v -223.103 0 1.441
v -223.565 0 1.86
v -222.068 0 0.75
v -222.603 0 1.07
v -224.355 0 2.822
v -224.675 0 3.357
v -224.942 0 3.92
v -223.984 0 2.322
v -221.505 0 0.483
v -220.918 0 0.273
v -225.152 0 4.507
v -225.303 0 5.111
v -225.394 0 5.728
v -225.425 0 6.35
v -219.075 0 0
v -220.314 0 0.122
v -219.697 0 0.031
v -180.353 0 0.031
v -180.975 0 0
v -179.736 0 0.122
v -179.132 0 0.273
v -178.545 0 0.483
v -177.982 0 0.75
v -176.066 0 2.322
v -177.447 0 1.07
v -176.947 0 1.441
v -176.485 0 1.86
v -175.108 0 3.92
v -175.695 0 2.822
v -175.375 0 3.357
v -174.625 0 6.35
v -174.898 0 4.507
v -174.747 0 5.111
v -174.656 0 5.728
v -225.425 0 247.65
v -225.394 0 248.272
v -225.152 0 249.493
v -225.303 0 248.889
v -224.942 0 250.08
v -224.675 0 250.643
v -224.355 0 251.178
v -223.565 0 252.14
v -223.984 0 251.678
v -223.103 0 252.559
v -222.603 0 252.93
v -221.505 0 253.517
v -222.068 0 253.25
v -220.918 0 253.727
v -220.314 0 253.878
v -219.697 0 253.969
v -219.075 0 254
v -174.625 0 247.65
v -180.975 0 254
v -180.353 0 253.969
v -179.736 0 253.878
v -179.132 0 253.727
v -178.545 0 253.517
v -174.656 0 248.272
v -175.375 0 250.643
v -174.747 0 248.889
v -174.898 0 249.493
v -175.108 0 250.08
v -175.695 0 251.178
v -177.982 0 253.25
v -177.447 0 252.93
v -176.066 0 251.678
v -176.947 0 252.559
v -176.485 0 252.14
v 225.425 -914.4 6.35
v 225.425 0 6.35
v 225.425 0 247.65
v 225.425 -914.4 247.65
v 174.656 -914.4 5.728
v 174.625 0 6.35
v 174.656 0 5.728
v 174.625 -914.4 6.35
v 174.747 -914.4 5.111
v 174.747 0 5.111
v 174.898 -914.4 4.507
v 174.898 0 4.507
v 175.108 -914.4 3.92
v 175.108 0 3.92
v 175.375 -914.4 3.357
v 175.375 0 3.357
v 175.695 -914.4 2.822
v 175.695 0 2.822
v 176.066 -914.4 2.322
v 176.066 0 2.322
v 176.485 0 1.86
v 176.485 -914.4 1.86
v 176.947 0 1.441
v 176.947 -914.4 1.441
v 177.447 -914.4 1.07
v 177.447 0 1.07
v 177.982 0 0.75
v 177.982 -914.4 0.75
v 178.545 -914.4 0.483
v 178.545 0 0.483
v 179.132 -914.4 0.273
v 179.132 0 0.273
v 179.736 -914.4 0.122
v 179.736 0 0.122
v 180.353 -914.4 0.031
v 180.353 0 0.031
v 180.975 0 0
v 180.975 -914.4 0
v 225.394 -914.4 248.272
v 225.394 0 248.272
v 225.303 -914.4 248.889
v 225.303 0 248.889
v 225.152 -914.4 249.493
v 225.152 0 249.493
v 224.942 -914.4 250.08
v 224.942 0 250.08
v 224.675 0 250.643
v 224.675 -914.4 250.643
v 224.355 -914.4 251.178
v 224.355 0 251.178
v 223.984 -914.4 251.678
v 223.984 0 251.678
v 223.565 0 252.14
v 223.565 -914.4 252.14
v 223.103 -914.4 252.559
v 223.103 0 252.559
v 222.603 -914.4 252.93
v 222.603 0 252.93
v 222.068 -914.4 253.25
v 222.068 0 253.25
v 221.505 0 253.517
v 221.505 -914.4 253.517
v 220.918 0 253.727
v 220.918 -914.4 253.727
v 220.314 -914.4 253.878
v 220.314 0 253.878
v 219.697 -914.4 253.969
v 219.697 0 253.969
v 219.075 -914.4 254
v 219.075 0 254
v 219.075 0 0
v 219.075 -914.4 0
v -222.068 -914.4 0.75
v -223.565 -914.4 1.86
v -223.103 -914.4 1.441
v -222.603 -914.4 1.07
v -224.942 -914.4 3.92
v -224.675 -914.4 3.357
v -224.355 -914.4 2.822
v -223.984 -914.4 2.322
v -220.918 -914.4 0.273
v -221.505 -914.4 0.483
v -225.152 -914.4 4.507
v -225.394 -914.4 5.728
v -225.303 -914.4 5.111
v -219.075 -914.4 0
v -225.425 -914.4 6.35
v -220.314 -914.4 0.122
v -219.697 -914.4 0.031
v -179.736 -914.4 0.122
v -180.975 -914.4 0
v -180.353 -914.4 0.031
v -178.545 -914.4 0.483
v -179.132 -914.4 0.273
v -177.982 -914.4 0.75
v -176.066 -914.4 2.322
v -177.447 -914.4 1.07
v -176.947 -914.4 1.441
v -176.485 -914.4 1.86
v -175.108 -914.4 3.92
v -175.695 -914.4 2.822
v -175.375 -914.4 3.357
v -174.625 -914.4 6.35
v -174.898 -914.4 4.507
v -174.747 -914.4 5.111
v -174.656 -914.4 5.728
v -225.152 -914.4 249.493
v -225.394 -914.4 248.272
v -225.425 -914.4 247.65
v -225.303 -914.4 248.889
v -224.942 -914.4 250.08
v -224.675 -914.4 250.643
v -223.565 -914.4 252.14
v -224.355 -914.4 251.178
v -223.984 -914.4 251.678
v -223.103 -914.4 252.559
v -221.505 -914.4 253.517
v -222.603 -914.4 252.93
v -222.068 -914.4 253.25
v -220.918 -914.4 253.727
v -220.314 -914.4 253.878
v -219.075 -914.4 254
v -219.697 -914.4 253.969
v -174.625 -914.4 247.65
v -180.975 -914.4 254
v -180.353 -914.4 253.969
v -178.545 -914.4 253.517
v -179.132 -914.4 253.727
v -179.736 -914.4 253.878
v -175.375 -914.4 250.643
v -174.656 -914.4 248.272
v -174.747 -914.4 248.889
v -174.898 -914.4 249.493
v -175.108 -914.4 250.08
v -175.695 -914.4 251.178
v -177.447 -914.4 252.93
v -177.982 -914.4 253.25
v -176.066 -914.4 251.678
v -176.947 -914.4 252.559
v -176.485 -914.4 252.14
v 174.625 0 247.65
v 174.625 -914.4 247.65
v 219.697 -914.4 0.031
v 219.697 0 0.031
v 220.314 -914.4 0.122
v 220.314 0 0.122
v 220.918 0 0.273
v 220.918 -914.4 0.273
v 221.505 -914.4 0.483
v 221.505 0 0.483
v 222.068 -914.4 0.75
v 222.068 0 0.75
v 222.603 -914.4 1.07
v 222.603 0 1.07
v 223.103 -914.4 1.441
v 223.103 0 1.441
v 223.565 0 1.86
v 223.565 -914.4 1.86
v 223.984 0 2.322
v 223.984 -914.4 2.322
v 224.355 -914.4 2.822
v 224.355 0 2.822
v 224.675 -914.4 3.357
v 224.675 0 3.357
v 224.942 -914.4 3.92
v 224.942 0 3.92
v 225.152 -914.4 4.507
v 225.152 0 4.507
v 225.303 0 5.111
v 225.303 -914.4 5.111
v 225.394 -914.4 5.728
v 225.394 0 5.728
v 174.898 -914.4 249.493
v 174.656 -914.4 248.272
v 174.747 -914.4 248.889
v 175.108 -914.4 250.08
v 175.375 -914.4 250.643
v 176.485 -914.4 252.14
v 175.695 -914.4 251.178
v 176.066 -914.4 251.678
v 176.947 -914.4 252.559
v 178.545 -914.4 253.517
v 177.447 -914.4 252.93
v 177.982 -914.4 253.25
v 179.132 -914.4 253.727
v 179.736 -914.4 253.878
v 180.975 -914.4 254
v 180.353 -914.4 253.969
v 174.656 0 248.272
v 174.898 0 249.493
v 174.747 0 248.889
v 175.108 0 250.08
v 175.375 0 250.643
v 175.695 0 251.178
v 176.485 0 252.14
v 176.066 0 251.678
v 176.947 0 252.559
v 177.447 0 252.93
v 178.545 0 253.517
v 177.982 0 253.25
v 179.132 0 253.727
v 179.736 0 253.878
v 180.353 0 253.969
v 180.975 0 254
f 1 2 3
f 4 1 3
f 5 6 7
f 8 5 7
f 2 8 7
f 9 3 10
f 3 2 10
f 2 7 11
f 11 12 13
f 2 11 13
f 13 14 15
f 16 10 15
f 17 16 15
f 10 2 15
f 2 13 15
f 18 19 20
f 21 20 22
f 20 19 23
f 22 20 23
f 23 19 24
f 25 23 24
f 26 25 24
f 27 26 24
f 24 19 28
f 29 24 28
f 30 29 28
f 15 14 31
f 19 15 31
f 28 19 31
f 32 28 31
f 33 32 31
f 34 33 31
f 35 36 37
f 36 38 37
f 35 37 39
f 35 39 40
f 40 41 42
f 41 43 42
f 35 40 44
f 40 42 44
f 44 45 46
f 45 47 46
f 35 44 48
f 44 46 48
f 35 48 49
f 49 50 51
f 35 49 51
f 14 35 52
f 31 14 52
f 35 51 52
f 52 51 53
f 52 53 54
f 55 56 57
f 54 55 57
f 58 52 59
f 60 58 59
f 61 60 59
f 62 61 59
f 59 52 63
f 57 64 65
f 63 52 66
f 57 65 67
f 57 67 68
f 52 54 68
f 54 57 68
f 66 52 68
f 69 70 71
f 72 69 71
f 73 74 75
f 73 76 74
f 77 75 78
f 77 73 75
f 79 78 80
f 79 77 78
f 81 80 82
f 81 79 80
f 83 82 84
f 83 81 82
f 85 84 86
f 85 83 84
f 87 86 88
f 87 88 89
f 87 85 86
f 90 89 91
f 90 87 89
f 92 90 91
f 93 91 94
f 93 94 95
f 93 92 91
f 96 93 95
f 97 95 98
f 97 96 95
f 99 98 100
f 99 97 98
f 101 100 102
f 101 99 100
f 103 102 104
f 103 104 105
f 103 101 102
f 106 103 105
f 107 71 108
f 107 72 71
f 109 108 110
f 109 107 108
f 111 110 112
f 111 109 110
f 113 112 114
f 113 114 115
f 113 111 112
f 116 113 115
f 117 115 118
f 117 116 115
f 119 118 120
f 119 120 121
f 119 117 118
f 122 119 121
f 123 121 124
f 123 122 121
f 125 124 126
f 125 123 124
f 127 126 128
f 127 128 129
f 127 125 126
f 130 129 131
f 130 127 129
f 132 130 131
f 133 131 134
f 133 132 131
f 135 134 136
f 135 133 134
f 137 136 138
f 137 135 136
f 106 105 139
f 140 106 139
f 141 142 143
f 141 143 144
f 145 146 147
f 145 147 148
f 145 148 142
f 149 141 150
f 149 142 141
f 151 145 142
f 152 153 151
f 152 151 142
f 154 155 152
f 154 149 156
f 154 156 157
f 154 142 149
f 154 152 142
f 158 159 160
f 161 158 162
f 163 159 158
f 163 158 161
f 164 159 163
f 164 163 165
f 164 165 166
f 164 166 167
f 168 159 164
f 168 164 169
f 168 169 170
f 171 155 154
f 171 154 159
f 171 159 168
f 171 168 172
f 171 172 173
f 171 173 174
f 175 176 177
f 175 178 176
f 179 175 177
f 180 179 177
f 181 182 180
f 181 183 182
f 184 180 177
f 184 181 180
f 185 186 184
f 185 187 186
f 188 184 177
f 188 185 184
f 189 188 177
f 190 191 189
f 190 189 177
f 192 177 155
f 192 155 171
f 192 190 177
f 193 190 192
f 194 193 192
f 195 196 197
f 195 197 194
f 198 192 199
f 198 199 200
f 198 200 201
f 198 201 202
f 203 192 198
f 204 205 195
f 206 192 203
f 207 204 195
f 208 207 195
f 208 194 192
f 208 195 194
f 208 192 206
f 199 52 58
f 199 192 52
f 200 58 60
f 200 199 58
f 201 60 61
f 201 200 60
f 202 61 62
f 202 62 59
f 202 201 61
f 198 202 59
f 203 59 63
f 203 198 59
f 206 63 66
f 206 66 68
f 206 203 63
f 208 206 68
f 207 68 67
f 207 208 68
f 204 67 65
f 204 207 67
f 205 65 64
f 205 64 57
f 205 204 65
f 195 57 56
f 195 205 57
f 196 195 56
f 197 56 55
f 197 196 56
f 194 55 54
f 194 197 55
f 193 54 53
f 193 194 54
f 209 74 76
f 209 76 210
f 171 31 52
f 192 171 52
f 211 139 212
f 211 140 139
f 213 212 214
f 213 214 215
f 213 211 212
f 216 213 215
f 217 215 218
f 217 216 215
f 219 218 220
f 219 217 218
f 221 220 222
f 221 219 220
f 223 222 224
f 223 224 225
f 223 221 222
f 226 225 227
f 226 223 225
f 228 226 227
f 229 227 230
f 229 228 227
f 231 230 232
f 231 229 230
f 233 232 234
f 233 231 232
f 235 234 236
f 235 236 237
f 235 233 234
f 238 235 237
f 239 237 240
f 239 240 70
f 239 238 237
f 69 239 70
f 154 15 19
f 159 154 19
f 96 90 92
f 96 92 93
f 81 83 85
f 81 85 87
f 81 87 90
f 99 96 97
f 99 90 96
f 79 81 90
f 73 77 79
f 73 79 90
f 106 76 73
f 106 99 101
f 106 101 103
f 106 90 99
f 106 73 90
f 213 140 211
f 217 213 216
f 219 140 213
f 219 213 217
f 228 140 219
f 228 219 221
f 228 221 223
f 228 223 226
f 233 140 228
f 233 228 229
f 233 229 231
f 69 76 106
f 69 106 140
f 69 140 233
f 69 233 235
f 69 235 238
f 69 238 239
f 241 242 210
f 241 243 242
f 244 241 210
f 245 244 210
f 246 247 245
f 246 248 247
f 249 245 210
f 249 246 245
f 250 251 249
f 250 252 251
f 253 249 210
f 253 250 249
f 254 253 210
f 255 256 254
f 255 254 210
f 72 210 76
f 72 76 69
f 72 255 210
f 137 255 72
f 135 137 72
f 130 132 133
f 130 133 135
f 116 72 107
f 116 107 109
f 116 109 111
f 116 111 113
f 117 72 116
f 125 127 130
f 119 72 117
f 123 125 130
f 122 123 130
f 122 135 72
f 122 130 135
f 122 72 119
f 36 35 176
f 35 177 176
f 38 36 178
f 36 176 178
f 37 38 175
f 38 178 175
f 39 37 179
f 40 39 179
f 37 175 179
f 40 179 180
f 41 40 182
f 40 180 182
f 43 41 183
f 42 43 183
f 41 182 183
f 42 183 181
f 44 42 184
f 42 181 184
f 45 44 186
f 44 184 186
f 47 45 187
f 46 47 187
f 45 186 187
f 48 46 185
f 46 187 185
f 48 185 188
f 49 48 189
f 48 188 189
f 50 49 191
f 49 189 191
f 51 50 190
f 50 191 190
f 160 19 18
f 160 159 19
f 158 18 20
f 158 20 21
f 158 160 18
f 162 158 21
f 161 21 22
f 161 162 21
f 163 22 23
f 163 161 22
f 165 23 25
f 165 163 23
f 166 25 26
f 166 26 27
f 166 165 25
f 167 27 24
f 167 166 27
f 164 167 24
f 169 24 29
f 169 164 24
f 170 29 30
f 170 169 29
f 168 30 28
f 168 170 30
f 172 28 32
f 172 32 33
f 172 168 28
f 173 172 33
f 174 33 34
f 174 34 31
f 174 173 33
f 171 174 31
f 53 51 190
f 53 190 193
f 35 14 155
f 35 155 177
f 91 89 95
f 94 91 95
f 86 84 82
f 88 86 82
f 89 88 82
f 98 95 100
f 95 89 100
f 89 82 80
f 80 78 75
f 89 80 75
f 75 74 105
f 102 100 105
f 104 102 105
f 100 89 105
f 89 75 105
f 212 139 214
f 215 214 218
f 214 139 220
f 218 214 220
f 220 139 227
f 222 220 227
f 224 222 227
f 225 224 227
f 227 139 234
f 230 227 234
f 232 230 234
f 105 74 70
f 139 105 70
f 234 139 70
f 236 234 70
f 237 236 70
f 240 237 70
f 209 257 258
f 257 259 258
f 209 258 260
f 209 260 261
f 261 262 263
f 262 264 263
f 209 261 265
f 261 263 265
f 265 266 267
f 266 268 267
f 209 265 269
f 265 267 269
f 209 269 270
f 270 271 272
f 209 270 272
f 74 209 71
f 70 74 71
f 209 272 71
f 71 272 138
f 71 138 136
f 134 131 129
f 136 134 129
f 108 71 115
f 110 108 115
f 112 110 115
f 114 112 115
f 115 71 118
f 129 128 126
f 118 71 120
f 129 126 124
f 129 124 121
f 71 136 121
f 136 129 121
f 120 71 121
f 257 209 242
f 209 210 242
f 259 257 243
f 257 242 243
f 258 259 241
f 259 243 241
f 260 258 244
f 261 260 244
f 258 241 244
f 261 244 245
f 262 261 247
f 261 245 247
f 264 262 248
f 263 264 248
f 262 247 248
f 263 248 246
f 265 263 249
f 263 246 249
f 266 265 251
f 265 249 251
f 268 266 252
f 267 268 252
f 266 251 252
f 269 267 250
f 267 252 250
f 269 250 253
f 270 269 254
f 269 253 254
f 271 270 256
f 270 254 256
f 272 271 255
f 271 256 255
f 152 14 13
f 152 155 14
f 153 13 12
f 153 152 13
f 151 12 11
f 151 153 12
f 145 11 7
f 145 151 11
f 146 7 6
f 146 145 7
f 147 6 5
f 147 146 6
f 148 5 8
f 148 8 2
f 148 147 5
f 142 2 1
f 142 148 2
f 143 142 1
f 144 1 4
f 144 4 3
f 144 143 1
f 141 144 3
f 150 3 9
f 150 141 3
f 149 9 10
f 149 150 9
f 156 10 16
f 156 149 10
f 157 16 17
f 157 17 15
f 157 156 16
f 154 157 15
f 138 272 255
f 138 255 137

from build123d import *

# Parameters (mm, degrees)
F0_W     = 50.8
F0_H     = 254
F1_DEPTH = 914.4
F2_R     = 6.35


with BuildPart() as f1:
    # F0 (on Front) → F1 (new body)
    with BuildSketch(Plane.XZ):
        with Locations((-200.025, 127)):
            Rectangle(F0_W, F0_H)
        with Locations((200.025, 127)):
            Rectangle(F0_W, F0_H)
    extrude(amount=F1_DEPTH)

    # F2
    f2_edges = [f1.edges().sort_by_distance(p)[0] for p in [
        (-174.625, -457.2, 254),
        (-225.425, -457.2, 254),
        (-174.625, -457.2, 0),
        (-225.425, -457.2, 0),
        (174.625, -457.2, 254),
        (225.425, -457.2, 254),
        (225.425, -457.2, 0),
        (174.625, -457.2, 0),
    ]]
    fillet(f2_edges, radius=F2_R)


solid = f1.part
